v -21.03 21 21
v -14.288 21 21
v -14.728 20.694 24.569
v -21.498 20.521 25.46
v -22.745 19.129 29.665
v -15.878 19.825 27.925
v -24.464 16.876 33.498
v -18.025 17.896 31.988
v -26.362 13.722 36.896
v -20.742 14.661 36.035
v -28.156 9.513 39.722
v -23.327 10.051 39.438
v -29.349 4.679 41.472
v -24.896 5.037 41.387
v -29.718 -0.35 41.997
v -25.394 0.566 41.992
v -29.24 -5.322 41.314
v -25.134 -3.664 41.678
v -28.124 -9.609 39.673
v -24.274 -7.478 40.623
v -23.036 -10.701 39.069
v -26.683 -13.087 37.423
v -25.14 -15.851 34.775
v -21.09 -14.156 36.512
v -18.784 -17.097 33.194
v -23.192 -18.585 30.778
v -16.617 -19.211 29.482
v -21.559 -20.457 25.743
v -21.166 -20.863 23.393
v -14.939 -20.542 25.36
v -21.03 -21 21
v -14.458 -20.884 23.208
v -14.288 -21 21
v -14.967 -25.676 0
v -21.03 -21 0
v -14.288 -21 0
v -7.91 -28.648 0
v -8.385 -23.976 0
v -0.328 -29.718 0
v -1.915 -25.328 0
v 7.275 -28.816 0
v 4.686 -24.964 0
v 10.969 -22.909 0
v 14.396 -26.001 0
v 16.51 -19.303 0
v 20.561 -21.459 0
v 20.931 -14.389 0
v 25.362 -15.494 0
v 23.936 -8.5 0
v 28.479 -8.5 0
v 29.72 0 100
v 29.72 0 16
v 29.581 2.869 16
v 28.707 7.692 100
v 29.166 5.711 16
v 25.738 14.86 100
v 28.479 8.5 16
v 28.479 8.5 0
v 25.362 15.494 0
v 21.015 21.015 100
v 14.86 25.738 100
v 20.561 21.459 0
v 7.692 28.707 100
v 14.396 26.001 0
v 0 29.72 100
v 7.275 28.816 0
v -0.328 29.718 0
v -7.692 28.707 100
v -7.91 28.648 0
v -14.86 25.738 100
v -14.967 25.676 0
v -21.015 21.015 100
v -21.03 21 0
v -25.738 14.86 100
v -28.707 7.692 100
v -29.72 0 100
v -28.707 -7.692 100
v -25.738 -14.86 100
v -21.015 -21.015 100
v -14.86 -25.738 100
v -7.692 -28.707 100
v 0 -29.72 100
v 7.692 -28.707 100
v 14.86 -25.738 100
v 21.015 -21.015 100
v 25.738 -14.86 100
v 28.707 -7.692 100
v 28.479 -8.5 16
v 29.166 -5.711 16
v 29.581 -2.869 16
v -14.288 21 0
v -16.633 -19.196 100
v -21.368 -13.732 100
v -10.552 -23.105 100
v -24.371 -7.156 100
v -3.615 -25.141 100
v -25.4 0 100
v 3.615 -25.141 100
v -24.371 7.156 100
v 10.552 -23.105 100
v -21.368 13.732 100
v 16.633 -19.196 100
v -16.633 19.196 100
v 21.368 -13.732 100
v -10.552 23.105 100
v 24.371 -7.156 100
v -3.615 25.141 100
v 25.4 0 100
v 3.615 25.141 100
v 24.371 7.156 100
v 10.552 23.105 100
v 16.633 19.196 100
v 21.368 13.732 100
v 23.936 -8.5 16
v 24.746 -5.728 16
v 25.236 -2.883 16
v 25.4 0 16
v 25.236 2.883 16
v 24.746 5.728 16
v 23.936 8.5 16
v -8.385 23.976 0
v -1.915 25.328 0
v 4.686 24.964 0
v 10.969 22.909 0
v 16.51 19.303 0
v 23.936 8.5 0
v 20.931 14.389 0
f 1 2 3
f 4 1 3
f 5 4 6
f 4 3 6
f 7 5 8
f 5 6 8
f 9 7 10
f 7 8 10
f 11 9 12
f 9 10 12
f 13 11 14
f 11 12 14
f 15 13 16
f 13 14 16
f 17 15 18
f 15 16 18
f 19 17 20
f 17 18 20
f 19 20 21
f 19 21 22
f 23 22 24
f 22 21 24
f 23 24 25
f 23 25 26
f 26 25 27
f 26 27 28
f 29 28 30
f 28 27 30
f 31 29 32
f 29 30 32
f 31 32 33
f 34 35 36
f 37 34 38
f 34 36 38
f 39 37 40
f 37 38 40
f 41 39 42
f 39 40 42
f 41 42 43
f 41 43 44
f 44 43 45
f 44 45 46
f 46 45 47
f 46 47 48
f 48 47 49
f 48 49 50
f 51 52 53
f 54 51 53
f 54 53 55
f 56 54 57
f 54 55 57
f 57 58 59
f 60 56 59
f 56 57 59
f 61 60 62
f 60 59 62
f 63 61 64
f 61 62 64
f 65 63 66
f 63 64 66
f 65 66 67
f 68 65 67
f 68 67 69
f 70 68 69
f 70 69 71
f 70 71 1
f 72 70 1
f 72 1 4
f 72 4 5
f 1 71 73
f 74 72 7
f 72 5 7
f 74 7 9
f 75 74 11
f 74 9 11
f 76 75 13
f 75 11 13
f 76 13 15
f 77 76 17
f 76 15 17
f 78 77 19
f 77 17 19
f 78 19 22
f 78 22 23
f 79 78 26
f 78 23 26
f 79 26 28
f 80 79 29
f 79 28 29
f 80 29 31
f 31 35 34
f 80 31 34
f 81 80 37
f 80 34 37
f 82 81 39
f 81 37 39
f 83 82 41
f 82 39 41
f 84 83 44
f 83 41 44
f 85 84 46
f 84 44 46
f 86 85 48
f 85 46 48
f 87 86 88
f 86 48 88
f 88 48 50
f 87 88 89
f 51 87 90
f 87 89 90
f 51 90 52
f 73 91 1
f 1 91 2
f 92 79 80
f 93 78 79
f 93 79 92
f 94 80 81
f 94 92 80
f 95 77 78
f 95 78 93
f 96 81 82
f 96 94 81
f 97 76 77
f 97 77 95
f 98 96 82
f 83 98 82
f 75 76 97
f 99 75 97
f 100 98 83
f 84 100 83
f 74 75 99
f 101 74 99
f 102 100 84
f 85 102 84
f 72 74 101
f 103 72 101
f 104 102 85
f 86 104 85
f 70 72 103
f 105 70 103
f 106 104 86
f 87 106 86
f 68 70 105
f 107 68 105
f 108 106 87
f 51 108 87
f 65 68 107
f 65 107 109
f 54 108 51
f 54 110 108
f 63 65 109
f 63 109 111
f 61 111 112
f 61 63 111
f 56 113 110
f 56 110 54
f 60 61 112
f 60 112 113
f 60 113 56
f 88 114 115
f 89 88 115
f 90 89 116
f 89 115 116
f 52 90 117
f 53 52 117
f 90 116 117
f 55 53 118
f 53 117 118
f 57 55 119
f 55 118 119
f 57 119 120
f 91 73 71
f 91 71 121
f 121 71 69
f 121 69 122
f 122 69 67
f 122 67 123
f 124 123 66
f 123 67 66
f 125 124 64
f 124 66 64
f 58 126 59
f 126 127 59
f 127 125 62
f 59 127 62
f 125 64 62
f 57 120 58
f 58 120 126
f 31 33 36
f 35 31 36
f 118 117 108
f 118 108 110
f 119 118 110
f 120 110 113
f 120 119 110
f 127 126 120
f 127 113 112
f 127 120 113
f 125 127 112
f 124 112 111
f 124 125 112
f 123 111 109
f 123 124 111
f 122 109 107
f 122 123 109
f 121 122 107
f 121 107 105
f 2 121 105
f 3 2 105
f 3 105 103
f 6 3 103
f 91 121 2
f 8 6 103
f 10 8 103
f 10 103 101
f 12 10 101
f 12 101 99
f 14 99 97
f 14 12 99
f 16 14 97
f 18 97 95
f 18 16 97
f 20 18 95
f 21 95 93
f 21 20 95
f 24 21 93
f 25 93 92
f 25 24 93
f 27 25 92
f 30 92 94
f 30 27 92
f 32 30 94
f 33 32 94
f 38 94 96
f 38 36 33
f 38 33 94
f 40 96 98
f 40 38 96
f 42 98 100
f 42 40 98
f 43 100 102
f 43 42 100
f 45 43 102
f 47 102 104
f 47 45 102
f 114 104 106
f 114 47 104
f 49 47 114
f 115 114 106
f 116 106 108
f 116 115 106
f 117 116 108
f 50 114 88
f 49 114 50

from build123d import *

# Parameters (mm, degrees)
CROQUIS1_R              = 29.72
CROQUIS1_R_2            = 25.4
SALIENTE_EXTRUIR1_DEPTH = 100
CORTAR_EXTRUIR2_DEPTH   = 109.473760883
CROQUIS4_W              = 16
CROQUIS4_H              = 17
CORTAR_EXTRUIR3_DEPTH   = 109.47376103


with BuildPart() as part:
    # Croquis1 → Saliente-Extruir1 (new body)
    with BuildSketch(Plane.XY):
        Circle(CROQUIS1_R)
        Circle(CROQUIS1_R_2, mode=Mode.SUBTRACT)
    extrude(amount=SALIENTE_EXTRUIR1_DEPTH)

    # Croquis3 → Cortar-Extruir2 (cut, through all)
    with BuildSketch(Plane(origin=(0, 0, 0), x_dir=(0, 0, -1), z_dir=(1, 0, 0))):
        with BuildLine():
            Line((0, 21), (-21, 21))
            ThreePointArc((-21, 21), (-42, 0), (-21, -21))
            Line((-21, -21), (0, -21))
            Line((0, -21), (0, 21))
        make_face()
    extrude(amount=-CORTAR_EXTRUIR2_DEPTH, mode=Mode.SUBTRACT)

    # Croquis4 → Cortar-Extruir3 (cut, through all)
    with BuildSketch(Plane(origin=(0, 0, 0), x_dir=(0, 0, -1), z_dir=(1, 0, 0))):
        with Locations((-8, 0)):
            Rectangle(CROQUIS4_W, CROQUIS4_H)
    extrude(amount=CORTAR_EXTRUIR3_DEPTH, mode=Mode.SUBTRACT)


solid = part.part
